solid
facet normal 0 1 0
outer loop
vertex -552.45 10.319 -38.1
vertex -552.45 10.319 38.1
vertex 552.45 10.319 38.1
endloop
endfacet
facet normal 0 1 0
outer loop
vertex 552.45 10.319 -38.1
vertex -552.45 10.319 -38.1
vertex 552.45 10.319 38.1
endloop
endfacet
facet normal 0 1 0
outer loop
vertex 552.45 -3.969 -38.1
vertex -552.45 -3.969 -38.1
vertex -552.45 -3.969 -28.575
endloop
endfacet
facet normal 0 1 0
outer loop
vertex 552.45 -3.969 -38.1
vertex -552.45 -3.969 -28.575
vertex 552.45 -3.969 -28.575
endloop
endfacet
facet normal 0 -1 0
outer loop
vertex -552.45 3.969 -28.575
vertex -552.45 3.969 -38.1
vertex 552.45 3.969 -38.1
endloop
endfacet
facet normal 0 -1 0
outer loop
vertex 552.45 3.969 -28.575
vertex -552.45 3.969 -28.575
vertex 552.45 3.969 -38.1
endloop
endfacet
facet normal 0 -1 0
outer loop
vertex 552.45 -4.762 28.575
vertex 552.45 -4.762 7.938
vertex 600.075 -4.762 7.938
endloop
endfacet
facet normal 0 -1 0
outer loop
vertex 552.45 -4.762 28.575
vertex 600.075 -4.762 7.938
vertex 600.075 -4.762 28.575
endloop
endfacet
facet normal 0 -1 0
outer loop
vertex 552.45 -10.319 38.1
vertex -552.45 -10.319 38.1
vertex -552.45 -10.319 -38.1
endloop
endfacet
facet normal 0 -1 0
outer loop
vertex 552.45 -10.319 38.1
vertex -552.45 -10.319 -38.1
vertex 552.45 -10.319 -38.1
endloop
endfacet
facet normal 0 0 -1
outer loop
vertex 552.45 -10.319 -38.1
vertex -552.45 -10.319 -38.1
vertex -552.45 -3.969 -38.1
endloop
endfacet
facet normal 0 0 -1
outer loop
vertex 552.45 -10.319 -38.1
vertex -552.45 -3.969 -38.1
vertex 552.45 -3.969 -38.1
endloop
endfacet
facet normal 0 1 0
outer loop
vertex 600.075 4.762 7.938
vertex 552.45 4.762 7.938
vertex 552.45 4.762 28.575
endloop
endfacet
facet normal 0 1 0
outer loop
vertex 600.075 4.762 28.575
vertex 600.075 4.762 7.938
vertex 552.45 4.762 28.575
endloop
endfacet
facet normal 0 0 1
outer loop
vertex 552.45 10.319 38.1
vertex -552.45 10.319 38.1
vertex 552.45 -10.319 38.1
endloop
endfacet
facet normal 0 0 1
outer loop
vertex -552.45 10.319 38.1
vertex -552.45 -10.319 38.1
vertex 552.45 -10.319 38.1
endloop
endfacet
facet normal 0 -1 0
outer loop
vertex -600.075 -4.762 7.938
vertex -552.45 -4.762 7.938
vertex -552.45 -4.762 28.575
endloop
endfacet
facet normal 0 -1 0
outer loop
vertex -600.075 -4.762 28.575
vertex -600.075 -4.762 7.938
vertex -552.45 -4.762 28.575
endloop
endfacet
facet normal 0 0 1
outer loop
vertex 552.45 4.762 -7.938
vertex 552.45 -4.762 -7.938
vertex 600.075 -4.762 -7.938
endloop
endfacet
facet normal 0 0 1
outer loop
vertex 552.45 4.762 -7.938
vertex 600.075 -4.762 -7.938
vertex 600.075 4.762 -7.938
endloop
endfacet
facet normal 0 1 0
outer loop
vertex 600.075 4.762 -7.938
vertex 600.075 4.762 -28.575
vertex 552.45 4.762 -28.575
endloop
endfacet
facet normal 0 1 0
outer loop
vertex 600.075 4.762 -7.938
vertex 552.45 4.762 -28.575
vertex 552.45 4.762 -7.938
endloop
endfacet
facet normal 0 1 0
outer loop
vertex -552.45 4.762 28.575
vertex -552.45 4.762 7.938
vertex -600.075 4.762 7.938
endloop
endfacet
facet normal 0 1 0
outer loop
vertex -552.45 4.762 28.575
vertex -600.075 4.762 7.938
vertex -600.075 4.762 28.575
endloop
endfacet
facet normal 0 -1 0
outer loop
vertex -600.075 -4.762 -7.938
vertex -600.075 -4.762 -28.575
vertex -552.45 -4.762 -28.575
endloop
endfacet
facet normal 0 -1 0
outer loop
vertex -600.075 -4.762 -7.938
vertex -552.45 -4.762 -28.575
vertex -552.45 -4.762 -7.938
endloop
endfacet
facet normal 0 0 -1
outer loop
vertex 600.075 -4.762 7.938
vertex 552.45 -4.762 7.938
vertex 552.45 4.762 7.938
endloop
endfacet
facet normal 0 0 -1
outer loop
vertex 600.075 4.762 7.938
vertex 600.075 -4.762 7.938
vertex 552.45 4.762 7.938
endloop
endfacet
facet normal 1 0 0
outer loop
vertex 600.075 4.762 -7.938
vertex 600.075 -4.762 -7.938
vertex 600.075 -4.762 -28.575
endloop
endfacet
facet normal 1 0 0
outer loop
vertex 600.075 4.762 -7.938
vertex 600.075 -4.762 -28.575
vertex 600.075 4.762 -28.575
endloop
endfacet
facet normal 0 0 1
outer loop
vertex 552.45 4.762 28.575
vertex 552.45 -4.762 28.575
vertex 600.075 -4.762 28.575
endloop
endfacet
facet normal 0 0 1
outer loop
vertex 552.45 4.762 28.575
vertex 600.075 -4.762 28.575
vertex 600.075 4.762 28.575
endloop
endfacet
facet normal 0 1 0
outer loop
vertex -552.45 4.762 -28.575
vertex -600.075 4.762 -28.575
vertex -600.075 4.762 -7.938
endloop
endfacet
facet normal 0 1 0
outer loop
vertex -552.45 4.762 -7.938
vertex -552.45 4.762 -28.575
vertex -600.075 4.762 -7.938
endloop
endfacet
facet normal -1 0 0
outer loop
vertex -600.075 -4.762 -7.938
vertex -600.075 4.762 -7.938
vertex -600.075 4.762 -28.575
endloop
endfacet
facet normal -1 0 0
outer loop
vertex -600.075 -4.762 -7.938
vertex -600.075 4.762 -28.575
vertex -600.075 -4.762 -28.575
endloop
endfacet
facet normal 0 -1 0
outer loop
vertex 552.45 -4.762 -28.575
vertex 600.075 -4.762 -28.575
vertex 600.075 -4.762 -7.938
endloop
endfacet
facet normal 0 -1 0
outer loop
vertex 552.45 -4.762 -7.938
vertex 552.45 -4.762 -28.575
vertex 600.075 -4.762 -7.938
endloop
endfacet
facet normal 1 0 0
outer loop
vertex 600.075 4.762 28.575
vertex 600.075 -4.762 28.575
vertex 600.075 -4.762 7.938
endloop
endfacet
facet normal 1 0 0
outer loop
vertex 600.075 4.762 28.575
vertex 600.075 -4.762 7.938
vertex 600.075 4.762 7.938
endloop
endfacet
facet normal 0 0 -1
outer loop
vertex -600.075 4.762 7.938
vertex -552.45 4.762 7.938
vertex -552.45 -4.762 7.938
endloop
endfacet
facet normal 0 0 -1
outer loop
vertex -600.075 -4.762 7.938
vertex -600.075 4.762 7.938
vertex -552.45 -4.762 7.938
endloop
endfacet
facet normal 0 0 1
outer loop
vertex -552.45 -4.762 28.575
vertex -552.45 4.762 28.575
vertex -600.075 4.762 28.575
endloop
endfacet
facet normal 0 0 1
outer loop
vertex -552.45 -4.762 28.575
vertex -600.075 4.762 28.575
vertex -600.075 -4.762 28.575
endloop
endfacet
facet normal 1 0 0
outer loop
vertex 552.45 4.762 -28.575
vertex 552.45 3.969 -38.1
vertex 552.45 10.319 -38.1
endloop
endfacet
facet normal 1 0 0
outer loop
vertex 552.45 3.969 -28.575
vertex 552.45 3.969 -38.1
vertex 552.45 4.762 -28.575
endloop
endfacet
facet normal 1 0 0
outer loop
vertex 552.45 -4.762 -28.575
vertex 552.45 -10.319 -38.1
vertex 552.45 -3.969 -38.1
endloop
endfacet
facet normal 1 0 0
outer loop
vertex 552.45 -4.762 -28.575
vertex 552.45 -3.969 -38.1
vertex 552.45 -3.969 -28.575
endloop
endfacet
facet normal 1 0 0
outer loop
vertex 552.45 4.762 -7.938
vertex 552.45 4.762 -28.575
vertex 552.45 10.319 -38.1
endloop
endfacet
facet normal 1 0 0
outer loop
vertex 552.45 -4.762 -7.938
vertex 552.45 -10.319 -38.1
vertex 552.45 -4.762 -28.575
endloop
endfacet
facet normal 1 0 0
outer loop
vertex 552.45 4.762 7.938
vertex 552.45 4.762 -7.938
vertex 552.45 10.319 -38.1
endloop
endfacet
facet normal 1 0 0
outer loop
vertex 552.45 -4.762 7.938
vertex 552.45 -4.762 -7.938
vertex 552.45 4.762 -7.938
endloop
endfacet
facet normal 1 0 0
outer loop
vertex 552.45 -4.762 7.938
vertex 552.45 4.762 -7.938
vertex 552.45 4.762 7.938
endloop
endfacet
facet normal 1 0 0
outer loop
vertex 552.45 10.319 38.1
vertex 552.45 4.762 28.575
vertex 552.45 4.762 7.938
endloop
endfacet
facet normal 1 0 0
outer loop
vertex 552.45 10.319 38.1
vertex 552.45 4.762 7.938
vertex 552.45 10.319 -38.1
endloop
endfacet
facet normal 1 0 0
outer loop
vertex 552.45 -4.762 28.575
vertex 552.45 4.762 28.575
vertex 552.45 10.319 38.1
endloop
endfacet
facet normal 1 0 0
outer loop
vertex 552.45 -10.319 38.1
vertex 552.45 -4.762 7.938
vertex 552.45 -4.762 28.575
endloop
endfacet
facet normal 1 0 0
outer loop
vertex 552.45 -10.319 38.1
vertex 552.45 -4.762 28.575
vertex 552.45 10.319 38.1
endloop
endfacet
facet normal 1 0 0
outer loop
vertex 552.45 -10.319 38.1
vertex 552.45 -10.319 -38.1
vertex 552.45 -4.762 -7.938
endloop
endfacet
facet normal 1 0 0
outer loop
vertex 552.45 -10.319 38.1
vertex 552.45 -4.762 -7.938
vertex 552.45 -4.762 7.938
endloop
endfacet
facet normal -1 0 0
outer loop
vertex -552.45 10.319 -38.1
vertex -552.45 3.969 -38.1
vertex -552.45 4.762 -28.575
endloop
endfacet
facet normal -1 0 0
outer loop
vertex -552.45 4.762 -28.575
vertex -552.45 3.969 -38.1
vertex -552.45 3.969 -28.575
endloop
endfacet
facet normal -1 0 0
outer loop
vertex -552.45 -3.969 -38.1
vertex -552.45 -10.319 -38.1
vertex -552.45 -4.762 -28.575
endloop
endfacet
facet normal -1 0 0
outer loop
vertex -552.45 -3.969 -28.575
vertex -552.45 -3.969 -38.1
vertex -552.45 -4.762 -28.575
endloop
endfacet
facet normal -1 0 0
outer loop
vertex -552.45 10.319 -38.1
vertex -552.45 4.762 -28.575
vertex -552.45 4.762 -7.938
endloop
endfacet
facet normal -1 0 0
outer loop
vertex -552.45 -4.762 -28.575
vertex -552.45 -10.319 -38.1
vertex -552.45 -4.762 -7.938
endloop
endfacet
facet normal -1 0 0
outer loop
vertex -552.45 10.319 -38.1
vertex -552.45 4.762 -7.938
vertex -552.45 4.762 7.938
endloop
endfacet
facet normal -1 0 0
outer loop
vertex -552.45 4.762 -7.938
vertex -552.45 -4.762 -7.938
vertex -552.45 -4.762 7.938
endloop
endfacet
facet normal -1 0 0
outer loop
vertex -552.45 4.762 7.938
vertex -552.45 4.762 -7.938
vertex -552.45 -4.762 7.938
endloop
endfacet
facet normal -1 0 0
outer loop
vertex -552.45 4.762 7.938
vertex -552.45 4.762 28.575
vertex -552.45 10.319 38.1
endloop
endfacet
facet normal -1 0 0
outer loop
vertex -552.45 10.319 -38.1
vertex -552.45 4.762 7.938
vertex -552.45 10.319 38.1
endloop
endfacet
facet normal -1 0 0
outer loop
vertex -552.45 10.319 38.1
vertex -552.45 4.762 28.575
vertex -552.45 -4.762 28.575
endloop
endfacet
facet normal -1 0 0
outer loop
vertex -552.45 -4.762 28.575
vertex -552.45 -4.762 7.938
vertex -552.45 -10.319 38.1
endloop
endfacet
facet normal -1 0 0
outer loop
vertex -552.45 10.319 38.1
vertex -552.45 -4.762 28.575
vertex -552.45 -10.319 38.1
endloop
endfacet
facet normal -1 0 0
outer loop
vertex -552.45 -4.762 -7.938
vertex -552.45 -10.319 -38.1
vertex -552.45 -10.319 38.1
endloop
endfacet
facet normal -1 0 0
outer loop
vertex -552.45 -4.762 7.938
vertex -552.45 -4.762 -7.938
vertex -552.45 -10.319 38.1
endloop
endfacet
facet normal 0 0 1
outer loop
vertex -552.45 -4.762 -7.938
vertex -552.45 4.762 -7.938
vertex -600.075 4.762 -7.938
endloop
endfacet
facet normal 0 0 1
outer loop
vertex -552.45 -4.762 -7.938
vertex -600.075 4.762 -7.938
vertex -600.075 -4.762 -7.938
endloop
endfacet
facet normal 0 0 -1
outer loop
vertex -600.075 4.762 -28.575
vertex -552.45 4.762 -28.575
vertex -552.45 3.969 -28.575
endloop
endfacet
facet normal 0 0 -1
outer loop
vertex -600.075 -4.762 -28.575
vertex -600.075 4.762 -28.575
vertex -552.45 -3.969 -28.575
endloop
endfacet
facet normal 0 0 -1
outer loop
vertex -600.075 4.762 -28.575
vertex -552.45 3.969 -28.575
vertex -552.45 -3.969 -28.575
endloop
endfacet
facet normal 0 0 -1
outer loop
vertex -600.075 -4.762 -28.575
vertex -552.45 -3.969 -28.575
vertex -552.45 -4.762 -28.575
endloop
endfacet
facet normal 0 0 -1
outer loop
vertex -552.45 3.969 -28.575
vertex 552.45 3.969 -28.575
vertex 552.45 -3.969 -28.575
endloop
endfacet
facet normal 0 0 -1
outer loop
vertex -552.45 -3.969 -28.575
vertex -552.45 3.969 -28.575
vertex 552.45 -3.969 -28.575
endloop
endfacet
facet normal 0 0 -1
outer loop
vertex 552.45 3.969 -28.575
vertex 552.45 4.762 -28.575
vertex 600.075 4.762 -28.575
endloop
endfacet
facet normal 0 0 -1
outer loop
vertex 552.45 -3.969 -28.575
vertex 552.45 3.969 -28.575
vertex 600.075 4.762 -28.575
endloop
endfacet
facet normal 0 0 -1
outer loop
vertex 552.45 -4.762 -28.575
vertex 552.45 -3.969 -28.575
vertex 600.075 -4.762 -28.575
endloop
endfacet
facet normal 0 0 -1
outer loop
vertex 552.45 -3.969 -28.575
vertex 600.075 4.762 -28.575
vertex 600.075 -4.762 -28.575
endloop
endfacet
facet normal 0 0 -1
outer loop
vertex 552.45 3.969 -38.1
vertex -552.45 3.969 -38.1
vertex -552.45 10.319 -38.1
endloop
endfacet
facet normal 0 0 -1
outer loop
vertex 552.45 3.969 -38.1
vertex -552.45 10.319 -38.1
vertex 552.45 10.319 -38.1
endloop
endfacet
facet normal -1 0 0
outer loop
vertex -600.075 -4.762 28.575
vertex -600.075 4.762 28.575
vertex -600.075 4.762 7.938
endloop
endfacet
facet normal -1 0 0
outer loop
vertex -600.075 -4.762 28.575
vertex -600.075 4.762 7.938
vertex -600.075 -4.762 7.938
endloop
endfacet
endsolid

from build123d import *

# Parameters (mm, degrees)
F0_W     = 1104.9
F0_H     = 76.2
F1_DEPTH = 10.31875
F2_W     = 9.525
F2_H     = 20.6375
F3_DEPTH = 47.625
F4_W     = 9.525
F4_H     = 20.6375
F5_DEPTH = 47.625
F6_W     = 1104.9
F6_H     = 7.9375
F7_DEPTH = 9.525


with BuildPart() as f1:
    # F0 (on Front) → F1 (new body, symmetric)
    with BuildSketch(Plane.XZ):
        Rectangle(F0_W, F0_H)
    extrude(amount=F1_DEPTH, both=True)

    # F2 (on face) → F3 (join)
    with BuildSketch(Plane.YZ.offset(552.45)):
        with Locations((0, 18.25625)):
            Rectangle(F2_W, F2_H)
        with Locations((0, -18.25625)):
            Rectangle(F2_W, F2_H)
    extrude(amount=F3_DEPTH)

    # F4 (on face) → F5 (join)
    with BuildSketch(Plane(origin=(-552.45, 0, 0), x_dir=(0, -1, 0), z_dir=(-1, 0, 0))):
        with Locations((0, -18.25625)):
            Rectangle(F4_W, F4_H)
        with Locations((0, 18.25625)):
            Rectangle(F4_W, F4_H)
    extrude(amount=F5_DEPTH)

    # F6 (on face) → F7 (cut)
    with BuildSketch(Plane(origin=(0, 0, -38.1), x_dir=(1, 0, 0), z_dir=(0, 0, -1))):
        Rectangle(F6_W, F6_H)
    extrude(amount=-F7_DEPTH, mode=Mode.SUBTRACT)


solid = f1.part
